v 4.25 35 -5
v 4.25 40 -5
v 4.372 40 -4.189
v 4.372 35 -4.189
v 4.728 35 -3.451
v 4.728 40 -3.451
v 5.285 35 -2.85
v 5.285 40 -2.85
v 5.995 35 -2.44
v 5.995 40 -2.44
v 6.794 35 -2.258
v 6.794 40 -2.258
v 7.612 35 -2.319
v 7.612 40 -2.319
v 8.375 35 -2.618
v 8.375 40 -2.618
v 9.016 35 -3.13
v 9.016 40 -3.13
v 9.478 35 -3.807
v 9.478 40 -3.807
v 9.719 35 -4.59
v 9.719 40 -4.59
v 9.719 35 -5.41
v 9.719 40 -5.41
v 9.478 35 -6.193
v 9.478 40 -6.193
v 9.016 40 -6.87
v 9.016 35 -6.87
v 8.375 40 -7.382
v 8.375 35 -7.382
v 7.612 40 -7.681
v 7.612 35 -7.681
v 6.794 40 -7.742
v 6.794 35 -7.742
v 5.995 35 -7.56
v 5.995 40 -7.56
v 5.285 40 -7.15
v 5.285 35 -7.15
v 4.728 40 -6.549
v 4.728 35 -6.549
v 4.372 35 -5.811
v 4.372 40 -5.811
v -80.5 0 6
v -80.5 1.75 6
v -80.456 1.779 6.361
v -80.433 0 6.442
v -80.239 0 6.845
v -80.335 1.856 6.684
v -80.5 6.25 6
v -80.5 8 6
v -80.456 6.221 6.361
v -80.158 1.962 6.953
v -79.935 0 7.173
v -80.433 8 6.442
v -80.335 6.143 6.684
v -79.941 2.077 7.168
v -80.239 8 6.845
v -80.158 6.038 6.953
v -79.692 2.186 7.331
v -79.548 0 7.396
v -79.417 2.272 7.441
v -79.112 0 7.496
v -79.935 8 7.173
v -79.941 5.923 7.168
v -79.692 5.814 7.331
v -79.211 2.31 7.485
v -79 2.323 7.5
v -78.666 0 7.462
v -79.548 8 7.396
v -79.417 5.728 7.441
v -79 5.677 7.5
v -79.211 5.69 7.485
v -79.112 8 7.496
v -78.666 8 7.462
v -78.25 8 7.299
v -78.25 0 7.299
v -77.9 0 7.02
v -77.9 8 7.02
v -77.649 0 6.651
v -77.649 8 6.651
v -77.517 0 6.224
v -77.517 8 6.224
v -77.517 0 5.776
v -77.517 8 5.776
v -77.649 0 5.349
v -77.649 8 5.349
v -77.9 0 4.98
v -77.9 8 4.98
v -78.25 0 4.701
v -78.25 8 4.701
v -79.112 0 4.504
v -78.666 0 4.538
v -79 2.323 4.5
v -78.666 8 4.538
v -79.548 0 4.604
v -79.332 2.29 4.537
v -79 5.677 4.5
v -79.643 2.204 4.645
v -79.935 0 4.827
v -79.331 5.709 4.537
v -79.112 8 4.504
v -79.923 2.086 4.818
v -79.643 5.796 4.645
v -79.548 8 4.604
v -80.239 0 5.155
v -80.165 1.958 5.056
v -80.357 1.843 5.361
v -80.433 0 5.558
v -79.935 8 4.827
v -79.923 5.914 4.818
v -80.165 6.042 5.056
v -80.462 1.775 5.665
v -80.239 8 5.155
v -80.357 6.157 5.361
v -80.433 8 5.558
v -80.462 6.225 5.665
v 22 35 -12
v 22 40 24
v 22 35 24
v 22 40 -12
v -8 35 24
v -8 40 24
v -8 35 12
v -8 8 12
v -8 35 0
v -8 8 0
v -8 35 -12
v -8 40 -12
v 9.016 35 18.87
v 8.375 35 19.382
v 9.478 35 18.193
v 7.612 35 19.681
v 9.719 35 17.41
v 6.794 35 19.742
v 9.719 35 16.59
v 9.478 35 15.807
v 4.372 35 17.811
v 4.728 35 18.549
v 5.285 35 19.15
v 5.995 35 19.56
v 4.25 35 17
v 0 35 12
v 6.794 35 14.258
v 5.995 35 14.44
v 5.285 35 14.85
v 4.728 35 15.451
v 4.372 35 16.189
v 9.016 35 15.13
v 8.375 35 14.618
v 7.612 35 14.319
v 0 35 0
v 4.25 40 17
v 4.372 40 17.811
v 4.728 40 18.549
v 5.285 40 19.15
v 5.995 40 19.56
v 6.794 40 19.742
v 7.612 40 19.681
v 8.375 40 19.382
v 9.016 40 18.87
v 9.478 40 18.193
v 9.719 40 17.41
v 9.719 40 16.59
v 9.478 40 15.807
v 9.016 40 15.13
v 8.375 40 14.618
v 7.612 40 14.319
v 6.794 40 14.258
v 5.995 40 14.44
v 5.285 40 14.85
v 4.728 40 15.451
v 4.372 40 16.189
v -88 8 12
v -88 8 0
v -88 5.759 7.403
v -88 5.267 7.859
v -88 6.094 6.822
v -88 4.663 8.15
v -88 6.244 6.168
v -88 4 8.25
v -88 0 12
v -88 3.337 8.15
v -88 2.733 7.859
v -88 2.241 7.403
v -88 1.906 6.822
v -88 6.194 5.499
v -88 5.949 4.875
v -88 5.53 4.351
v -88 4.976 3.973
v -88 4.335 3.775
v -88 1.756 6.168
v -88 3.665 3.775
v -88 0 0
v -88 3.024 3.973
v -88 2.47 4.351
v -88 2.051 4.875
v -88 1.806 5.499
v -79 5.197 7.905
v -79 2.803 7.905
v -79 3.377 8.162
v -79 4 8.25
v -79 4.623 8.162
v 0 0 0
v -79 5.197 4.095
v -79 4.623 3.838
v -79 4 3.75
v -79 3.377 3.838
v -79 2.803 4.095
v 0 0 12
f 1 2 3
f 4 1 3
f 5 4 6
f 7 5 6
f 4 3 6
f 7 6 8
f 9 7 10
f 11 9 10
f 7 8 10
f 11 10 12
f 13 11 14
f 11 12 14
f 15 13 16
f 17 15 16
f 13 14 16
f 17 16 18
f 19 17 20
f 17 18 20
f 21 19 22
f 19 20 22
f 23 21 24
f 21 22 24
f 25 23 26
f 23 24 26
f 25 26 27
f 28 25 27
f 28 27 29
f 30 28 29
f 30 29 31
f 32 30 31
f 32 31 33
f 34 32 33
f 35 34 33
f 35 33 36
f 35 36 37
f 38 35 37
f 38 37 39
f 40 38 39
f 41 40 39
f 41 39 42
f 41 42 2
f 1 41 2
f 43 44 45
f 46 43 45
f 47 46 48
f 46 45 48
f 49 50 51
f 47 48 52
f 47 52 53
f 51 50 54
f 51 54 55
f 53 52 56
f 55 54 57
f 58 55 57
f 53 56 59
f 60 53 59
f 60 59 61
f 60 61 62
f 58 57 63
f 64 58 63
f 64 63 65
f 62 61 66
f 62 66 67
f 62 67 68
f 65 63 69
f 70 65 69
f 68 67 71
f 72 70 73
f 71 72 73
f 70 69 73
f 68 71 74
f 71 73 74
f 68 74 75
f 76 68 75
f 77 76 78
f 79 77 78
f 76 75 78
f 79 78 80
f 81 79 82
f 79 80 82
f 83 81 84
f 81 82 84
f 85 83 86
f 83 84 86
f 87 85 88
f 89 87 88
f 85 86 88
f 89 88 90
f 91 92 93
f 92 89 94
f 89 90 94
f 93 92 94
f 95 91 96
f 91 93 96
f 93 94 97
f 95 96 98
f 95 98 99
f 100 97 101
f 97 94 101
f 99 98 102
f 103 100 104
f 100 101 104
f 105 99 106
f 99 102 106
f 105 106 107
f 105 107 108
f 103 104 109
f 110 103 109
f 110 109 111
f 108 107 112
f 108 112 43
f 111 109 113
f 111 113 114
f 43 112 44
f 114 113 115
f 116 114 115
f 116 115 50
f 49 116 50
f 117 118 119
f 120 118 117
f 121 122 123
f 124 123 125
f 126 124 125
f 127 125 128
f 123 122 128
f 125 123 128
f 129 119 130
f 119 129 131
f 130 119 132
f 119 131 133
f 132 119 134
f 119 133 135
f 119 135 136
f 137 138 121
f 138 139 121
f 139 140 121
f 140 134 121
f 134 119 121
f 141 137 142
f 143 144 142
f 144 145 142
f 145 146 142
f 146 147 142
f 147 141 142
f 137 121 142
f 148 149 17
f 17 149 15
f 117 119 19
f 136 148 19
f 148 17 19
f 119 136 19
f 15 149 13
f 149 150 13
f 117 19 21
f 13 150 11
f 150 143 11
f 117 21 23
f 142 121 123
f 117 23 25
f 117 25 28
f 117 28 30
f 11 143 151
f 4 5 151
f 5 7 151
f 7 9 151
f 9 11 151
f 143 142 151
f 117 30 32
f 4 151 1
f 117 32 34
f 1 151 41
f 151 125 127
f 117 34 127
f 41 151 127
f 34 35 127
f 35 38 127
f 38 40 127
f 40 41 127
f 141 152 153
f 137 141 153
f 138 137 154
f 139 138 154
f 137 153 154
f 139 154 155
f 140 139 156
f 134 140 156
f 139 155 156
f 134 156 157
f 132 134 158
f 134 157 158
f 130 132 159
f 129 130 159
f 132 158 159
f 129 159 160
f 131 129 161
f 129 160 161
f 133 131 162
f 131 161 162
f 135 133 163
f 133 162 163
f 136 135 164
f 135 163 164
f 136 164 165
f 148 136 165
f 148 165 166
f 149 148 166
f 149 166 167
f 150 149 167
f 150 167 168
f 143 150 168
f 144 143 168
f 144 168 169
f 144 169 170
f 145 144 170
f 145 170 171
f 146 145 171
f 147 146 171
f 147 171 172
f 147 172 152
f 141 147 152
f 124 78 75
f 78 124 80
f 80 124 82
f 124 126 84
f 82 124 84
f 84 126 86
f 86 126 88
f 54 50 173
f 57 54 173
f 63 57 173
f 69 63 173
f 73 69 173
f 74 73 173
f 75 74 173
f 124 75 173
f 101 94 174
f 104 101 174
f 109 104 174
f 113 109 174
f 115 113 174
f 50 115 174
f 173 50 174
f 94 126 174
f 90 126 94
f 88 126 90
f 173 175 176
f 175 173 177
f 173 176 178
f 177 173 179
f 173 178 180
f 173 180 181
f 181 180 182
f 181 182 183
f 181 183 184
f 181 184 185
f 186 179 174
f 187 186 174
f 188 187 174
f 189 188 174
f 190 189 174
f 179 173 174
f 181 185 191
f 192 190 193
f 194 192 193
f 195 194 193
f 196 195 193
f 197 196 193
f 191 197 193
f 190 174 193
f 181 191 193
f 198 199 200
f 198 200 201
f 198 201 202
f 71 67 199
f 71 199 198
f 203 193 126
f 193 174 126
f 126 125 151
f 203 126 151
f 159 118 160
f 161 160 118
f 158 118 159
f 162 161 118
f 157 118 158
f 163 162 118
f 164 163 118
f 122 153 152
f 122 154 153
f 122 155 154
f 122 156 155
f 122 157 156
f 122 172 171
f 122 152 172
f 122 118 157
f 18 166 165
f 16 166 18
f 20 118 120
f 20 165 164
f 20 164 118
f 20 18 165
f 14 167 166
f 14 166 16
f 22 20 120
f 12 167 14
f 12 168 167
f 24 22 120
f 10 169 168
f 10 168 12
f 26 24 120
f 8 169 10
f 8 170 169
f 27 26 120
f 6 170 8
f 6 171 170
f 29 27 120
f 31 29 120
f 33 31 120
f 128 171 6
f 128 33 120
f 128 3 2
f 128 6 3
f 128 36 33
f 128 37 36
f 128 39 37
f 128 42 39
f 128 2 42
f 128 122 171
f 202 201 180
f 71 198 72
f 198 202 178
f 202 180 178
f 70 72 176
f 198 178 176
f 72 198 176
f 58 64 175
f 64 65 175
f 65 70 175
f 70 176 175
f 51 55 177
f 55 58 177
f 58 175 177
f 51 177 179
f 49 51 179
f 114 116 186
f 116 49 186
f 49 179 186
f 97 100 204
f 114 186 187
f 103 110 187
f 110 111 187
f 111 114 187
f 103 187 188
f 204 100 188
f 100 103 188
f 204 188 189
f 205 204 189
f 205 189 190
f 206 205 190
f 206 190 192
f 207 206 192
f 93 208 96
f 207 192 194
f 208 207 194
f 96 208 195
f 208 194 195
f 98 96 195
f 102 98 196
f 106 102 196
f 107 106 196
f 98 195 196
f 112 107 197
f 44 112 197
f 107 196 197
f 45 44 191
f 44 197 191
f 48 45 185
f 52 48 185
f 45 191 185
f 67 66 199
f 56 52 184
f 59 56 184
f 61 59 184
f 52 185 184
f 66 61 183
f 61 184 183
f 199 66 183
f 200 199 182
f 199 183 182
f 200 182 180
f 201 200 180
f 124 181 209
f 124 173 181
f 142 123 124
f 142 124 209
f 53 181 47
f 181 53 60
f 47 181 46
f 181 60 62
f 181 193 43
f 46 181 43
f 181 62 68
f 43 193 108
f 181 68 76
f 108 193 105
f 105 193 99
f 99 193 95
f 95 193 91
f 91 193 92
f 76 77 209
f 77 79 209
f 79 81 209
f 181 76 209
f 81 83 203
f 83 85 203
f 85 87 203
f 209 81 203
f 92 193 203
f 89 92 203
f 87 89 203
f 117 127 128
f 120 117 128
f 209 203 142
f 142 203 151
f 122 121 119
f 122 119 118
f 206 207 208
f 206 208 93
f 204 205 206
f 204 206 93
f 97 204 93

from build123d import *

# Parameters (mm, degrees)
BOSS_EXTRUDE1_DEPTH = 12
SKETCH2_R           = 1.5
CUT_EXTRUDE1_DEPTH  = 12
SKETCH3_R           = 2.25
CUT_EXTRUDE2_DEPTH  = 9
SKETCH4_W           = 36
SKETCH4_H           = 5
BOSS_EXTRUDE2_DEPTH = 30
SKETCH5_R           = 2.75
CUT_EXTRUDE3_DEPTH  = 30


with BuildPart() as part:
    # Sketch1 → Boss-Extrude1 (new body)
    with BuildSketch(Plane.XY):
        Polygon((0, 0), (0, 40), (-8, 40), (-8, 8), (-88, 8), (-88, 0), align=None)
    extrude(amount=BOSS_EXTRUDE1_DEPTH)

    # Sketch2 → Cut-Extrude1 (cut)
    with BuildSketch(Plane(origin=(0, 8, 0), x_dir=(1, 0, 0), z_dir=(0, 1, 0))):
        with Locations(Location((-79, -6, 0), (0, 0, 180))):
            Circle(SKETCH2_R)
    extrude(amount=-CUT_EXTRUDE1_DEPTH, mode=Mode.SUBTRACT)

    # Sketch3 → Cut-Extrude2 (cut)
    with BuildSketch(Plane.ZY.offset(88)):
        with Locations((6, 4)):
            Circle(SKETCH3_R)
    extrude(amount=-CUT_EXTRUDE2_DEPTH, mode=Mode.SUBTRACT)

    # Sketch4 → Boss-Extrude2 (add)
    with BuildSketch(Plane(origin=(-8, 0, 0), x_dir=(0, 0, -1), z_dir=(1, 0, 0))):
        with Locations((-6, 37.5)):
            Rectangle(SKETCH4_W, SKETCH4_H)
    extrude(amount=BOSS_EXTRUDE2_DEPTH)

    # Sketch5 → Cut-Extrude3 (cut)
    with BuildSketch(Plane(origin=(0, 40, 0), x_dir=(1, 0, 0), z_dir=(0, 1, 0))):
        with Locations(Location((7, -17, 0), (0, 0, 180))):
            Circle(SKETCH5_R)
        with Locations(Location((7, 5, 0), (0, 0, 180))):
            Circle(SKETCH5_R)
    extrude(amount=-CUT_EXTRUDE3_DEPTH, mode=Mode.SUBTRACT)


solid = part.part
